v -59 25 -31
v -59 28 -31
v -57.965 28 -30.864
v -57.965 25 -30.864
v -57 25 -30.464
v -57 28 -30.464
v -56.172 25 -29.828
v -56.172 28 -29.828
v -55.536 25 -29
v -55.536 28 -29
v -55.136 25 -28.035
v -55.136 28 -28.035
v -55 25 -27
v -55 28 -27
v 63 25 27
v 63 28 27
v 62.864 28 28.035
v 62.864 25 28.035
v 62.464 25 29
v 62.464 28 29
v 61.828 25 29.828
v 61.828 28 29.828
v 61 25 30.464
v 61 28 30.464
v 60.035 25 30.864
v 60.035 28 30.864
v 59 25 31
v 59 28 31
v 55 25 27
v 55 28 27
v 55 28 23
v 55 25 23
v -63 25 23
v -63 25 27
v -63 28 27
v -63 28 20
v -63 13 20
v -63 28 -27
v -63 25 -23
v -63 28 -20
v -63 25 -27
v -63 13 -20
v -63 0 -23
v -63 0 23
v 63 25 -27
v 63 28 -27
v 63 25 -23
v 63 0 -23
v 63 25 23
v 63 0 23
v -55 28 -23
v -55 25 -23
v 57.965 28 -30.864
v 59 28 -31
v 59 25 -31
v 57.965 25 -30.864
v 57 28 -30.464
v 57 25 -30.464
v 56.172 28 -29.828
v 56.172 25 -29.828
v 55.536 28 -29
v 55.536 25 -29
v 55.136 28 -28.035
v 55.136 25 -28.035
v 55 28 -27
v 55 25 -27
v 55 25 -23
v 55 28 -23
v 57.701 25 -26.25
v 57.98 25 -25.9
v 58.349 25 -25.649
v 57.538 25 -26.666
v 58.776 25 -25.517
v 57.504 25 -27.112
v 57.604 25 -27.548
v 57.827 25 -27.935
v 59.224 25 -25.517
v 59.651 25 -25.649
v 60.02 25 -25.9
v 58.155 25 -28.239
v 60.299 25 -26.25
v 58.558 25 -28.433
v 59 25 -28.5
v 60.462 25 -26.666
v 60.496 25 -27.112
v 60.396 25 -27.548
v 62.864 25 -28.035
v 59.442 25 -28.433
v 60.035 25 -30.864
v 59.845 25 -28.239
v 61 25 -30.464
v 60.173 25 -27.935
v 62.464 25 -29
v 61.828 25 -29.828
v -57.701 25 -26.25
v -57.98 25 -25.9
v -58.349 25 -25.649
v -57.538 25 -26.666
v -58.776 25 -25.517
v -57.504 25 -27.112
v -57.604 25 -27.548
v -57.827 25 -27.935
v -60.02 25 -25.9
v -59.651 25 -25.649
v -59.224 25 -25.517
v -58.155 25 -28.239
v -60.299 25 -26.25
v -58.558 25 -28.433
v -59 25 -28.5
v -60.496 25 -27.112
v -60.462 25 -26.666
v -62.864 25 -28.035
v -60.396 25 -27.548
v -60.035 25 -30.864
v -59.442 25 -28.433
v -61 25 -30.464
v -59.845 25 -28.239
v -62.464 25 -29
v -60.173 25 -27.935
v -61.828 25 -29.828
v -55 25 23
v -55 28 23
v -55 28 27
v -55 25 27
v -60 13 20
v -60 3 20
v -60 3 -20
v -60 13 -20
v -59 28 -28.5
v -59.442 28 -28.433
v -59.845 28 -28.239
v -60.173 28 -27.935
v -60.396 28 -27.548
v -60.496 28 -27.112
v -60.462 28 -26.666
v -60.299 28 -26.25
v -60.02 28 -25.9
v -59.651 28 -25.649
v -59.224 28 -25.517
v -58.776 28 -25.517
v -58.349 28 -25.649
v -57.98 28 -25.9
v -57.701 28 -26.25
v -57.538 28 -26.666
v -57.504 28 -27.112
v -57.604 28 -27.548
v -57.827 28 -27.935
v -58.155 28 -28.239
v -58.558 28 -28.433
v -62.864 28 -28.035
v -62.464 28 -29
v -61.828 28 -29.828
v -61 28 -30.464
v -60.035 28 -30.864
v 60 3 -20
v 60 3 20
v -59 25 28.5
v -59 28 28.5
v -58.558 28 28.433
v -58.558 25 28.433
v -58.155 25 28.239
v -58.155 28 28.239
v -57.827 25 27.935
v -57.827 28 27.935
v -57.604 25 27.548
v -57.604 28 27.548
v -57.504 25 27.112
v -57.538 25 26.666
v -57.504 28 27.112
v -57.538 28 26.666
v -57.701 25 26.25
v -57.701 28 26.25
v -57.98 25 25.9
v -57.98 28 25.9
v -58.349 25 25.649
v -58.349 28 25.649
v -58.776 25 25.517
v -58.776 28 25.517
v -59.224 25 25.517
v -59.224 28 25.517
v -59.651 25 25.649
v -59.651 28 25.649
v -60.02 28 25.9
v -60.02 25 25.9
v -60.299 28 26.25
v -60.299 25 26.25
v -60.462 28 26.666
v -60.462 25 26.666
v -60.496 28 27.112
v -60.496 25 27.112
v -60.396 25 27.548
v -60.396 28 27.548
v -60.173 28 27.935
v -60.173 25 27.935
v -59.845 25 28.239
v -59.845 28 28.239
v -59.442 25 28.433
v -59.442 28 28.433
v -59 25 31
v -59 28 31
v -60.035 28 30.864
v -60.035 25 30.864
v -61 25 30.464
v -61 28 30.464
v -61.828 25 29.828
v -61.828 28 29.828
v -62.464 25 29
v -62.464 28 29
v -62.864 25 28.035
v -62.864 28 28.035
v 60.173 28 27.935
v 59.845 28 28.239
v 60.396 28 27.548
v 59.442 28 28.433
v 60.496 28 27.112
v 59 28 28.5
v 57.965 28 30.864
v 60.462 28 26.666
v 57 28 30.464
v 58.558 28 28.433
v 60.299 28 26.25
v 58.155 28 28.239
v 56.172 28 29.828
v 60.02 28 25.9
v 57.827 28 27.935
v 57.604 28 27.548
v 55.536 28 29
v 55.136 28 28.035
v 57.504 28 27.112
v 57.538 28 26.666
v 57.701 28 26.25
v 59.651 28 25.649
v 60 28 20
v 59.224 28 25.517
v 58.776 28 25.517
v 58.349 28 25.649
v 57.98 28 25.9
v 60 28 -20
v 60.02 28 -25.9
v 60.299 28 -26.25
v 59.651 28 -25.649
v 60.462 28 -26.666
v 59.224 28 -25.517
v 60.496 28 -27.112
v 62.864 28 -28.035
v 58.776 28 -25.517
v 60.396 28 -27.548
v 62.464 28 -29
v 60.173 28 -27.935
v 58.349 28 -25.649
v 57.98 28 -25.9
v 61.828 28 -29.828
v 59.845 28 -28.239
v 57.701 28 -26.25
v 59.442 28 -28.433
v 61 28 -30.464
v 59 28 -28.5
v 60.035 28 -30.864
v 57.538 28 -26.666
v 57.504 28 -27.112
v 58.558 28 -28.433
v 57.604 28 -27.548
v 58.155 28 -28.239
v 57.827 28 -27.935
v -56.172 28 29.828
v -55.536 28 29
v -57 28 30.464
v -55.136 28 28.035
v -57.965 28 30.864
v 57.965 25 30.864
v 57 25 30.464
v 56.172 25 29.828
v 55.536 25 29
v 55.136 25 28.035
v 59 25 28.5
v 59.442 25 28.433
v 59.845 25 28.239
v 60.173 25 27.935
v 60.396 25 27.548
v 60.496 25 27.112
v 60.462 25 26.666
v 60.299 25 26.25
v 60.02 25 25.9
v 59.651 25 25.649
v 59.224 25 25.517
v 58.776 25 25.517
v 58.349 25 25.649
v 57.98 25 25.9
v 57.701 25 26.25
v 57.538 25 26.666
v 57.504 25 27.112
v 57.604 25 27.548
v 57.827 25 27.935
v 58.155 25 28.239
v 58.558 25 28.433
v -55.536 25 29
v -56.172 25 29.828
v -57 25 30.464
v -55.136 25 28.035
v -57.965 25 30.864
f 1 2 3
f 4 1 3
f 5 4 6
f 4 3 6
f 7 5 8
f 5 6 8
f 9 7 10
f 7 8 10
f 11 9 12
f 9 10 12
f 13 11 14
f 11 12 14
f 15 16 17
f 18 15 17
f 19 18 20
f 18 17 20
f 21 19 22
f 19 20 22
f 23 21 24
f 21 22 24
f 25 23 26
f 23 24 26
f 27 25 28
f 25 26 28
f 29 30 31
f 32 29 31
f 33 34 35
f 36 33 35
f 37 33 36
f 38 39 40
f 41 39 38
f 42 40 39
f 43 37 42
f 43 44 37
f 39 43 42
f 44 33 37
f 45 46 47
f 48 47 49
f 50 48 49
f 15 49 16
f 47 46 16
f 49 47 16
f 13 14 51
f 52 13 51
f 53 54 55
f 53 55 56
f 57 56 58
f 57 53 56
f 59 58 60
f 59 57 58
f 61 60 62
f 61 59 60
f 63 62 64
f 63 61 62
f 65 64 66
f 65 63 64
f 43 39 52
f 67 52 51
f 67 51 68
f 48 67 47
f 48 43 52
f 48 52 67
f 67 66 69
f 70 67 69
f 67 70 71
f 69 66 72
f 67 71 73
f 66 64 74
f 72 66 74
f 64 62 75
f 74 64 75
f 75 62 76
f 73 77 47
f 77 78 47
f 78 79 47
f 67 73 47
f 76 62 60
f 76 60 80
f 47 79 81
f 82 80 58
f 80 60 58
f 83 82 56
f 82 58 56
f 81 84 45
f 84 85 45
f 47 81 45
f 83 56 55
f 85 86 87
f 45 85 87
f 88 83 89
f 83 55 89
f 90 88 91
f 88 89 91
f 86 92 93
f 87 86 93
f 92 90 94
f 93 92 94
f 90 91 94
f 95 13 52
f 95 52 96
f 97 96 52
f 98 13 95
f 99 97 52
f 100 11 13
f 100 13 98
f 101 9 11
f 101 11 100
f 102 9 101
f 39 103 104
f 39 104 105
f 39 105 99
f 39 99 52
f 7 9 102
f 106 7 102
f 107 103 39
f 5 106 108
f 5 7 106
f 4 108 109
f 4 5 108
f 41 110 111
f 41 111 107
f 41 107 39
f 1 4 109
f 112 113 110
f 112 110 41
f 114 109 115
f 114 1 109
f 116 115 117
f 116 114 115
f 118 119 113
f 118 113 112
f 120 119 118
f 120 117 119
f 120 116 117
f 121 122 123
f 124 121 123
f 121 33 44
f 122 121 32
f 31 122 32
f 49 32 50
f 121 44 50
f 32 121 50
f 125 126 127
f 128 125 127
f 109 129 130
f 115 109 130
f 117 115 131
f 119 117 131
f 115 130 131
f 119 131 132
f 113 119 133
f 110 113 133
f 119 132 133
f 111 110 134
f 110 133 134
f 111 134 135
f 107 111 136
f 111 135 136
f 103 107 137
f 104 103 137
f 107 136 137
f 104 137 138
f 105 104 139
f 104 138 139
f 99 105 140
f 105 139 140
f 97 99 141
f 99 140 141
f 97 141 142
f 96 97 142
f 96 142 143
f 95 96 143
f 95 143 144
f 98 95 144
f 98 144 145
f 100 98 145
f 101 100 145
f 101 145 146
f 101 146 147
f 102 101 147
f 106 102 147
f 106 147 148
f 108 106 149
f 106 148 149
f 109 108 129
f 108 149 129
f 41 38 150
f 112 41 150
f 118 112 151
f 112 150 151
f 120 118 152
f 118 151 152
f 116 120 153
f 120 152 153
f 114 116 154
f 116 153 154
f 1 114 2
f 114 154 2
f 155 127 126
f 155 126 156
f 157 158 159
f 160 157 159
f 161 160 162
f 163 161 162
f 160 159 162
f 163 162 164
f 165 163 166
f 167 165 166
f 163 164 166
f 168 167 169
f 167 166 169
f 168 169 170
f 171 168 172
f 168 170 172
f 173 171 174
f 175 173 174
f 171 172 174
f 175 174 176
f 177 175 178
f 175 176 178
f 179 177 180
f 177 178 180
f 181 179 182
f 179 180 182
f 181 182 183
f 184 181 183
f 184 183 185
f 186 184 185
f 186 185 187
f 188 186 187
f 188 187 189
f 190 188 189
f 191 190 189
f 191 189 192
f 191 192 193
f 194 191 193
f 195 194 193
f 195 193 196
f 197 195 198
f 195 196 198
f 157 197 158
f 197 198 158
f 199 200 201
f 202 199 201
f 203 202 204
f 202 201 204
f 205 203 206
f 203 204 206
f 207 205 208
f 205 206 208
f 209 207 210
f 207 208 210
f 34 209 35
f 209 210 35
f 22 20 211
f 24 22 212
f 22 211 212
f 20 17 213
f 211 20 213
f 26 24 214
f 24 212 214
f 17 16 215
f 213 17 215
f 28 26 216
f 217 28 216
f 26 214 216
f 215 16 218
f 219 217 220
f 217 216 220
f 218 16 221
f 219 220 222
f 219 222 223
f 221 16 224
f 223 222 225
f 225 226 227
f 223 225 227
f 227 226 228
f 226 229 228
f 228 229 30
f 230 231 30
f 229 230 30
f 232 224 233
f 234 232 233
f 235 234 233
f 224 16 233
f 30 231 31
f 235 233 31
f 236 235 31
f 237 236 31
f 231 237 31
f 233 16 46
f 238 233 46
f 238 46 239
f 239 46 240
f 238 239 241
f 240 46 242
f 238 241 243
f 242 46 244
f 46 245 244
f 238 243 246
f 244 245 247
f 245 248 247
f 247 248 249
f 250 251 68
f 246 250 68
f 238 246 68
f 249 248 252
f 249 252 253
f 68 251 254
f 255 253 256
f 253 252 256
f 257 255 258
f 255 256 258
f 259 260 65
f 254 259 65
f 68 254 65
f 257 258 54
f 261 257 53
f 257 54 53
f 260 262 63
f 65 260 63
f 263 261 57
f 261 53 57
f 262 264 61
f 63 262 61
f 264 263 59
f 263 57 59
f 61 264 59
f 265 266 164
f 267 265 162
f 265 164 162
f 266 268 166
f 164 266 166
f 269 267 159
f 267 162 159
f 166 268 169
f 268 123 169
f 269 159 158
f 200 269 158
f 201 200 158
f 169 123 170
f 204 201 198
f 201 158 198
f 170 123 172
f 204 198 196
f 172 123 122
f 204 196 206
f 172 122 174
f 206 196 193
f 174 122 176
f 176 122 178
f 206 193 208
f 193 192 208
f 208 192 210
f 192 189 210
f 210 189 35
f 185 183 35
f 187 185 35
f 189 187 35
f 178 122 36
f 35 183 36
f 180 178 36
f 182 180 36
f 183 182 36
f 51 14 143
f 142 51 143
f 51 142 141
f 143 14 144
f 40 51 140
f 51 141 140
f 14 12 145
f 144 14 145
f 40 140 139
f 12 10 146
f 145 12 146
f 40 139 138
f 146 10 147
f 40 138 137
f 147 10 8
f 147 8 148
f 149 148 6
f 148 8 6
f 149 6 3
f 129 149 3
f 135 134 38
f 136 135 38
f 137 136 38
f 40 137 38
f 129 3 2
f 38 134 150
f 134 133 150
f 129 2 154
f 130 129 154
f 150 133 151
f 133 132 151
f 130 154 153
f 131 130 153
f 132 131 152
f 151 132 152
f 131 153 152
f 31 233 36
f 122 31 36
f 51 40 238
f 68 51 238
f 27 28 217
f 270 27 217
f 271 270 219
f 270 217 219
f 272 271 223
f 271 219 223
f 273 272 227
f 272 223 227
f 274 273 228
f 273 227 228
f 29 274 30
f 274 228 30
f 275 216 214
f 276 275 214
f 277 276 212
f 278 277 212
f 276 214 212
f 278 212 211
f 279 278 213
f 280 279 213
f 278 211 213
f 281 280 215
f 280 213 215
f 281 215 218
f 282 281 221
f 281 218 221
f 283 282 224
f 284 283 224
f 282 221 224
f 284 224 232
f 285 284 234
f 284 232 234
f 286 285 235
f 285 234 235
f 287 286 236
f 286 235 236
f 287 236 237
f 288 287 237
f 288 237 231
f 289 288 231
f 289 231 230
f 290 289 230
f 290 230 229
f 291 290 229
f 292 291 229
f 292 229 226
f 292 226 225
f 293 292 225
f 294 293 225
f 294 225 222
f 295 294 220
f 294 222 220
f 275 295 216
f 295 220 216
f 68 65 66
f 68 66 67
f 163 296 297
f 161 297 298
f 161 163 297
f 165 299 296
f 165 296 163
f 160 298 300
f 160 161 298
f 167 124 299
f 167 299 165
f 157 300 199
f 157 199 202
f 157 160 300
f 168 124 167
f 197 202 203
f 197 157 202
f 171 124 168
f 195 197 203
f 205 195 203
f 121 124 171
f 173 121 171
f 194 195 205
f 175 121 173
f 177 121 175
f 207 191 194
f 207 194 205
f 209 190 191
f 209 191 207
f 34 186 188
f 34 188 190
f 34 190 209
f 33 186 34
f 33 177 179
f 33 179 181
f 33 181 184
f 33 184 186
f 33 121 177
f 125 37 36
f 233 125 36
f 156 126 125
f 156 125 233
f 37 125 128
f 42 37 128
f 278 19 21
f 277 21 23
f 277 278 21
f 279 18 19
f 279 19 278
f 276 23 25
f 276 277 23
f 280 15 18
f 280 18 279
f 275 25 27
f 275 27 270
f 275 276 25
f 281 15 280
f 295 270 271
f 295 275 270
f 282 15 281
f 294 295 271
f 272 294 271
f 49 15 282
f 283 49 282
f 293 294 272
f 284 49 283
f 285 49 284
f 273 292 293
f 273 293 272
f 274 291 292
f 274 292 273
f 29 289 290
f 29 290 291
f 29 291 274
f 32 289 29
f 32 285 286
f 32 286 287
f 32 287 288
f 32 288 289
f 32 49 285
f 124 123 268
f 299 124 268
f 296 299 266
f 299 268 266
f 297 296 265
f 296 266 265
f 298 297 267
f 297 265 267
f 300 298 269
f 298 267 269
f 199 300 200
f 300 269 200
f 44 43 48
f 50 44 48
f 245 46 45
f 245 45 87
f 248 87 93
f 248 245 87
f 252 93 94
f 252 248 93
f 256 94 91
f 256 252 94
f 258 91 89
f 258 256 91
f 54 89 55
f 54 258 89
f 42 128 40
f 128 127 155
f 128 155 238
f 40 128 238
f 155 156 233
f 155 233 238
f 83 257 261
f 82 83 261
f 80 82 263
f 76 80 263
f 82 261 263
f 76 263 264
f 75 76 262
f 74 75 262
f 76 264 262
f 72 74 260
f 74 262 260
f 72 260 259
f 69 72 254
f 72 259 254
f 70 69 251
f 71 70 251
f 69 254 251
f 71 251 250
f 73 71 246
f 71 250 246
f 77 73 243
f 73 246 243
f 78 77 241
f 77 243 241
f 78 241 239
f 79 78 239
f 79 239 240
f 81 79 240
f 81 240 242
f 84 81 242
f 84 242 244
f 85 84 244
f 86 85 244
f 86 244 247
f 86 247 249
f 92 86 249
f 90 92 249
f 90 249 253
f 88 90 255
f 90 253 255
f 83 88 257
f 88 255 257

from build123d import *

# Parameters (mm, degrees)
SKETCH1_W      = 126
SKETCH1_H      = 46
EXTRUDE1_DEPTH = 3
SKETCH2_W      = 126
SKETCH2_H      = 46
SKETCH2_W_2    = 120
SKETCH2_H_2    = 40
EXTRUDE2_DEPTH = 25
SKETCH3_R      = 1.5
EXTRUDE3_DEPTH = 3
SKETCH4_W      = 40
SKETCH4_H      = 15
EXTRUDE4_DEPTH = 3


with BuildPart() as part:
    # Sketch1 → Extrude1 (new body)
    with BuildSketch(Plane(origin=(0, 0, 0), x_dir=(1, 0, 0), z_dir=(0, 1, 0))):
        Rectangle(SKETCH1_W, SKETCH1_H)
    extrude(amount=EXTRUDE1_DEPTH)

    # Sketch2 → Extrude2 (add)
    with BuildSketch(Plane(origin=(0, 3, 0), x_dir=(1, 0, 0), z_dir=(0, 1, 0))):
        Rectangle(SKETCH2_W, SKETCH2_H)
        Rectangle(SKETCH2_W_2, SKETCH2_H_2, mode=Mode.SUBTRACT)
    extrude(amount=EXTRUDE2_DEPTH)

    # Sketch3 → Extrude3 (add)
    # profile 1 of 4: a face of its own
    with BuildSketch(Plane(origin=(0, 28, 0), x_dir=(1, 0, 0), z_dir=(0, 1, 0))):
        with BuildLine():
            Line((63, -23), (63, -27))
            ThreePointArc((63, -27), (61.828427125, -29.828427125), (59, -31))
            ThreePointArc((59, -31), (56.171572875, -29.828427125), (55, -27))
            Line((55, -27), (55, -23))
            Line((55, -23), (63, -23))
        make_face()
        with Locations(Location((59, -27, 0), (0, 0, 270))):
            Circle(SKETCH3_R, mode=Mode.SUBTRACT)
    # profile 2 of 4: a face of its own
    with BuildSketch(Plane(origin=(0, 28, 0), x_dir=(1, 0, 0), z_dir=(0, 1, 0))):
        with BuildLine():
            Line((-63, -23), (-55, -23))
            Line((-55, -23), (-55, -27))
            ThreePointArc((-55, -27), (-56.171572875, -29.828427125), (-59, -31))
            ThreePointArc((-59, -31), (-61.828427125, -29.828427125), (-63, -27))
            Line((-63, -27), (-63, -23))
        make_face()
        with Locations(Location((-59, -27, 0), (0, 0, 270))):
            Circle(SKETCH3_R, mode=Mode.SUBTRACT)
    # profile 3 of 4: a face of its own
    with BuildSketch(Plane(origin=(0, 28, 0), x_dir=(1, 0, 0), z_dir=(0, 1, 0))):
        with BuildLine():
            Line((55, 27), (55, 23))
            Line((55, 23), (63, 23))
            Line((63, 23), (63, 27))
            ThreePointArc((63, 27), (61.828427125, 29.828427125), (59, 31))
            ThreePointArc((59, 31), (56.171572875, 29.828427125), (55, 27))
        make_face()
        with Locations(Location((59, 27, 0), (0, 0, 90))):
            Circle(SKETCH3_R, mode=Mode.SUBTRACT)
    # profile 4 of 4: a face of its own
    with BuildSketch(Plane(origin=(0, 28, 0), x_dir=(1, 0, 0), z_dir=(0, 1, 0))):
        with BuildLine():
            Line((-55, 27), (-55, 23))
            Line((-55, 23), (-63, 23))
            Line((-63, 23), (-63, 27))
            ThreePointArc((-63, 27), (-61.828427125, 29.828427125), (-59, 31))
            ThreePointArc((-59, 31), (-56.171572875, 29.828427125), (-55, 27))
        make_face()
        with Locations(Location((-59, 27, 0), (0, 0, 90))):
            Circle(SKETCH3_R, mode=Mode.SUBTRACT)
    extrude(amount=-EXTRUDE3_DEPTH)

    # Sketch4 → Extrude4 (cut)
    with BuildSketch(Plane(origin=(-60, 0, 0), x_dir=(0, 0, -1), z_dir=(1, 0, 0))):
        with Locations((0, 20.5)):
            Rectangle(SKETCH4_W, SKETCH4_H)
    extrude(amount=-EXTRUDE4_DEPTH, mode=Mode.SUBTRACT)


solid = part.part
